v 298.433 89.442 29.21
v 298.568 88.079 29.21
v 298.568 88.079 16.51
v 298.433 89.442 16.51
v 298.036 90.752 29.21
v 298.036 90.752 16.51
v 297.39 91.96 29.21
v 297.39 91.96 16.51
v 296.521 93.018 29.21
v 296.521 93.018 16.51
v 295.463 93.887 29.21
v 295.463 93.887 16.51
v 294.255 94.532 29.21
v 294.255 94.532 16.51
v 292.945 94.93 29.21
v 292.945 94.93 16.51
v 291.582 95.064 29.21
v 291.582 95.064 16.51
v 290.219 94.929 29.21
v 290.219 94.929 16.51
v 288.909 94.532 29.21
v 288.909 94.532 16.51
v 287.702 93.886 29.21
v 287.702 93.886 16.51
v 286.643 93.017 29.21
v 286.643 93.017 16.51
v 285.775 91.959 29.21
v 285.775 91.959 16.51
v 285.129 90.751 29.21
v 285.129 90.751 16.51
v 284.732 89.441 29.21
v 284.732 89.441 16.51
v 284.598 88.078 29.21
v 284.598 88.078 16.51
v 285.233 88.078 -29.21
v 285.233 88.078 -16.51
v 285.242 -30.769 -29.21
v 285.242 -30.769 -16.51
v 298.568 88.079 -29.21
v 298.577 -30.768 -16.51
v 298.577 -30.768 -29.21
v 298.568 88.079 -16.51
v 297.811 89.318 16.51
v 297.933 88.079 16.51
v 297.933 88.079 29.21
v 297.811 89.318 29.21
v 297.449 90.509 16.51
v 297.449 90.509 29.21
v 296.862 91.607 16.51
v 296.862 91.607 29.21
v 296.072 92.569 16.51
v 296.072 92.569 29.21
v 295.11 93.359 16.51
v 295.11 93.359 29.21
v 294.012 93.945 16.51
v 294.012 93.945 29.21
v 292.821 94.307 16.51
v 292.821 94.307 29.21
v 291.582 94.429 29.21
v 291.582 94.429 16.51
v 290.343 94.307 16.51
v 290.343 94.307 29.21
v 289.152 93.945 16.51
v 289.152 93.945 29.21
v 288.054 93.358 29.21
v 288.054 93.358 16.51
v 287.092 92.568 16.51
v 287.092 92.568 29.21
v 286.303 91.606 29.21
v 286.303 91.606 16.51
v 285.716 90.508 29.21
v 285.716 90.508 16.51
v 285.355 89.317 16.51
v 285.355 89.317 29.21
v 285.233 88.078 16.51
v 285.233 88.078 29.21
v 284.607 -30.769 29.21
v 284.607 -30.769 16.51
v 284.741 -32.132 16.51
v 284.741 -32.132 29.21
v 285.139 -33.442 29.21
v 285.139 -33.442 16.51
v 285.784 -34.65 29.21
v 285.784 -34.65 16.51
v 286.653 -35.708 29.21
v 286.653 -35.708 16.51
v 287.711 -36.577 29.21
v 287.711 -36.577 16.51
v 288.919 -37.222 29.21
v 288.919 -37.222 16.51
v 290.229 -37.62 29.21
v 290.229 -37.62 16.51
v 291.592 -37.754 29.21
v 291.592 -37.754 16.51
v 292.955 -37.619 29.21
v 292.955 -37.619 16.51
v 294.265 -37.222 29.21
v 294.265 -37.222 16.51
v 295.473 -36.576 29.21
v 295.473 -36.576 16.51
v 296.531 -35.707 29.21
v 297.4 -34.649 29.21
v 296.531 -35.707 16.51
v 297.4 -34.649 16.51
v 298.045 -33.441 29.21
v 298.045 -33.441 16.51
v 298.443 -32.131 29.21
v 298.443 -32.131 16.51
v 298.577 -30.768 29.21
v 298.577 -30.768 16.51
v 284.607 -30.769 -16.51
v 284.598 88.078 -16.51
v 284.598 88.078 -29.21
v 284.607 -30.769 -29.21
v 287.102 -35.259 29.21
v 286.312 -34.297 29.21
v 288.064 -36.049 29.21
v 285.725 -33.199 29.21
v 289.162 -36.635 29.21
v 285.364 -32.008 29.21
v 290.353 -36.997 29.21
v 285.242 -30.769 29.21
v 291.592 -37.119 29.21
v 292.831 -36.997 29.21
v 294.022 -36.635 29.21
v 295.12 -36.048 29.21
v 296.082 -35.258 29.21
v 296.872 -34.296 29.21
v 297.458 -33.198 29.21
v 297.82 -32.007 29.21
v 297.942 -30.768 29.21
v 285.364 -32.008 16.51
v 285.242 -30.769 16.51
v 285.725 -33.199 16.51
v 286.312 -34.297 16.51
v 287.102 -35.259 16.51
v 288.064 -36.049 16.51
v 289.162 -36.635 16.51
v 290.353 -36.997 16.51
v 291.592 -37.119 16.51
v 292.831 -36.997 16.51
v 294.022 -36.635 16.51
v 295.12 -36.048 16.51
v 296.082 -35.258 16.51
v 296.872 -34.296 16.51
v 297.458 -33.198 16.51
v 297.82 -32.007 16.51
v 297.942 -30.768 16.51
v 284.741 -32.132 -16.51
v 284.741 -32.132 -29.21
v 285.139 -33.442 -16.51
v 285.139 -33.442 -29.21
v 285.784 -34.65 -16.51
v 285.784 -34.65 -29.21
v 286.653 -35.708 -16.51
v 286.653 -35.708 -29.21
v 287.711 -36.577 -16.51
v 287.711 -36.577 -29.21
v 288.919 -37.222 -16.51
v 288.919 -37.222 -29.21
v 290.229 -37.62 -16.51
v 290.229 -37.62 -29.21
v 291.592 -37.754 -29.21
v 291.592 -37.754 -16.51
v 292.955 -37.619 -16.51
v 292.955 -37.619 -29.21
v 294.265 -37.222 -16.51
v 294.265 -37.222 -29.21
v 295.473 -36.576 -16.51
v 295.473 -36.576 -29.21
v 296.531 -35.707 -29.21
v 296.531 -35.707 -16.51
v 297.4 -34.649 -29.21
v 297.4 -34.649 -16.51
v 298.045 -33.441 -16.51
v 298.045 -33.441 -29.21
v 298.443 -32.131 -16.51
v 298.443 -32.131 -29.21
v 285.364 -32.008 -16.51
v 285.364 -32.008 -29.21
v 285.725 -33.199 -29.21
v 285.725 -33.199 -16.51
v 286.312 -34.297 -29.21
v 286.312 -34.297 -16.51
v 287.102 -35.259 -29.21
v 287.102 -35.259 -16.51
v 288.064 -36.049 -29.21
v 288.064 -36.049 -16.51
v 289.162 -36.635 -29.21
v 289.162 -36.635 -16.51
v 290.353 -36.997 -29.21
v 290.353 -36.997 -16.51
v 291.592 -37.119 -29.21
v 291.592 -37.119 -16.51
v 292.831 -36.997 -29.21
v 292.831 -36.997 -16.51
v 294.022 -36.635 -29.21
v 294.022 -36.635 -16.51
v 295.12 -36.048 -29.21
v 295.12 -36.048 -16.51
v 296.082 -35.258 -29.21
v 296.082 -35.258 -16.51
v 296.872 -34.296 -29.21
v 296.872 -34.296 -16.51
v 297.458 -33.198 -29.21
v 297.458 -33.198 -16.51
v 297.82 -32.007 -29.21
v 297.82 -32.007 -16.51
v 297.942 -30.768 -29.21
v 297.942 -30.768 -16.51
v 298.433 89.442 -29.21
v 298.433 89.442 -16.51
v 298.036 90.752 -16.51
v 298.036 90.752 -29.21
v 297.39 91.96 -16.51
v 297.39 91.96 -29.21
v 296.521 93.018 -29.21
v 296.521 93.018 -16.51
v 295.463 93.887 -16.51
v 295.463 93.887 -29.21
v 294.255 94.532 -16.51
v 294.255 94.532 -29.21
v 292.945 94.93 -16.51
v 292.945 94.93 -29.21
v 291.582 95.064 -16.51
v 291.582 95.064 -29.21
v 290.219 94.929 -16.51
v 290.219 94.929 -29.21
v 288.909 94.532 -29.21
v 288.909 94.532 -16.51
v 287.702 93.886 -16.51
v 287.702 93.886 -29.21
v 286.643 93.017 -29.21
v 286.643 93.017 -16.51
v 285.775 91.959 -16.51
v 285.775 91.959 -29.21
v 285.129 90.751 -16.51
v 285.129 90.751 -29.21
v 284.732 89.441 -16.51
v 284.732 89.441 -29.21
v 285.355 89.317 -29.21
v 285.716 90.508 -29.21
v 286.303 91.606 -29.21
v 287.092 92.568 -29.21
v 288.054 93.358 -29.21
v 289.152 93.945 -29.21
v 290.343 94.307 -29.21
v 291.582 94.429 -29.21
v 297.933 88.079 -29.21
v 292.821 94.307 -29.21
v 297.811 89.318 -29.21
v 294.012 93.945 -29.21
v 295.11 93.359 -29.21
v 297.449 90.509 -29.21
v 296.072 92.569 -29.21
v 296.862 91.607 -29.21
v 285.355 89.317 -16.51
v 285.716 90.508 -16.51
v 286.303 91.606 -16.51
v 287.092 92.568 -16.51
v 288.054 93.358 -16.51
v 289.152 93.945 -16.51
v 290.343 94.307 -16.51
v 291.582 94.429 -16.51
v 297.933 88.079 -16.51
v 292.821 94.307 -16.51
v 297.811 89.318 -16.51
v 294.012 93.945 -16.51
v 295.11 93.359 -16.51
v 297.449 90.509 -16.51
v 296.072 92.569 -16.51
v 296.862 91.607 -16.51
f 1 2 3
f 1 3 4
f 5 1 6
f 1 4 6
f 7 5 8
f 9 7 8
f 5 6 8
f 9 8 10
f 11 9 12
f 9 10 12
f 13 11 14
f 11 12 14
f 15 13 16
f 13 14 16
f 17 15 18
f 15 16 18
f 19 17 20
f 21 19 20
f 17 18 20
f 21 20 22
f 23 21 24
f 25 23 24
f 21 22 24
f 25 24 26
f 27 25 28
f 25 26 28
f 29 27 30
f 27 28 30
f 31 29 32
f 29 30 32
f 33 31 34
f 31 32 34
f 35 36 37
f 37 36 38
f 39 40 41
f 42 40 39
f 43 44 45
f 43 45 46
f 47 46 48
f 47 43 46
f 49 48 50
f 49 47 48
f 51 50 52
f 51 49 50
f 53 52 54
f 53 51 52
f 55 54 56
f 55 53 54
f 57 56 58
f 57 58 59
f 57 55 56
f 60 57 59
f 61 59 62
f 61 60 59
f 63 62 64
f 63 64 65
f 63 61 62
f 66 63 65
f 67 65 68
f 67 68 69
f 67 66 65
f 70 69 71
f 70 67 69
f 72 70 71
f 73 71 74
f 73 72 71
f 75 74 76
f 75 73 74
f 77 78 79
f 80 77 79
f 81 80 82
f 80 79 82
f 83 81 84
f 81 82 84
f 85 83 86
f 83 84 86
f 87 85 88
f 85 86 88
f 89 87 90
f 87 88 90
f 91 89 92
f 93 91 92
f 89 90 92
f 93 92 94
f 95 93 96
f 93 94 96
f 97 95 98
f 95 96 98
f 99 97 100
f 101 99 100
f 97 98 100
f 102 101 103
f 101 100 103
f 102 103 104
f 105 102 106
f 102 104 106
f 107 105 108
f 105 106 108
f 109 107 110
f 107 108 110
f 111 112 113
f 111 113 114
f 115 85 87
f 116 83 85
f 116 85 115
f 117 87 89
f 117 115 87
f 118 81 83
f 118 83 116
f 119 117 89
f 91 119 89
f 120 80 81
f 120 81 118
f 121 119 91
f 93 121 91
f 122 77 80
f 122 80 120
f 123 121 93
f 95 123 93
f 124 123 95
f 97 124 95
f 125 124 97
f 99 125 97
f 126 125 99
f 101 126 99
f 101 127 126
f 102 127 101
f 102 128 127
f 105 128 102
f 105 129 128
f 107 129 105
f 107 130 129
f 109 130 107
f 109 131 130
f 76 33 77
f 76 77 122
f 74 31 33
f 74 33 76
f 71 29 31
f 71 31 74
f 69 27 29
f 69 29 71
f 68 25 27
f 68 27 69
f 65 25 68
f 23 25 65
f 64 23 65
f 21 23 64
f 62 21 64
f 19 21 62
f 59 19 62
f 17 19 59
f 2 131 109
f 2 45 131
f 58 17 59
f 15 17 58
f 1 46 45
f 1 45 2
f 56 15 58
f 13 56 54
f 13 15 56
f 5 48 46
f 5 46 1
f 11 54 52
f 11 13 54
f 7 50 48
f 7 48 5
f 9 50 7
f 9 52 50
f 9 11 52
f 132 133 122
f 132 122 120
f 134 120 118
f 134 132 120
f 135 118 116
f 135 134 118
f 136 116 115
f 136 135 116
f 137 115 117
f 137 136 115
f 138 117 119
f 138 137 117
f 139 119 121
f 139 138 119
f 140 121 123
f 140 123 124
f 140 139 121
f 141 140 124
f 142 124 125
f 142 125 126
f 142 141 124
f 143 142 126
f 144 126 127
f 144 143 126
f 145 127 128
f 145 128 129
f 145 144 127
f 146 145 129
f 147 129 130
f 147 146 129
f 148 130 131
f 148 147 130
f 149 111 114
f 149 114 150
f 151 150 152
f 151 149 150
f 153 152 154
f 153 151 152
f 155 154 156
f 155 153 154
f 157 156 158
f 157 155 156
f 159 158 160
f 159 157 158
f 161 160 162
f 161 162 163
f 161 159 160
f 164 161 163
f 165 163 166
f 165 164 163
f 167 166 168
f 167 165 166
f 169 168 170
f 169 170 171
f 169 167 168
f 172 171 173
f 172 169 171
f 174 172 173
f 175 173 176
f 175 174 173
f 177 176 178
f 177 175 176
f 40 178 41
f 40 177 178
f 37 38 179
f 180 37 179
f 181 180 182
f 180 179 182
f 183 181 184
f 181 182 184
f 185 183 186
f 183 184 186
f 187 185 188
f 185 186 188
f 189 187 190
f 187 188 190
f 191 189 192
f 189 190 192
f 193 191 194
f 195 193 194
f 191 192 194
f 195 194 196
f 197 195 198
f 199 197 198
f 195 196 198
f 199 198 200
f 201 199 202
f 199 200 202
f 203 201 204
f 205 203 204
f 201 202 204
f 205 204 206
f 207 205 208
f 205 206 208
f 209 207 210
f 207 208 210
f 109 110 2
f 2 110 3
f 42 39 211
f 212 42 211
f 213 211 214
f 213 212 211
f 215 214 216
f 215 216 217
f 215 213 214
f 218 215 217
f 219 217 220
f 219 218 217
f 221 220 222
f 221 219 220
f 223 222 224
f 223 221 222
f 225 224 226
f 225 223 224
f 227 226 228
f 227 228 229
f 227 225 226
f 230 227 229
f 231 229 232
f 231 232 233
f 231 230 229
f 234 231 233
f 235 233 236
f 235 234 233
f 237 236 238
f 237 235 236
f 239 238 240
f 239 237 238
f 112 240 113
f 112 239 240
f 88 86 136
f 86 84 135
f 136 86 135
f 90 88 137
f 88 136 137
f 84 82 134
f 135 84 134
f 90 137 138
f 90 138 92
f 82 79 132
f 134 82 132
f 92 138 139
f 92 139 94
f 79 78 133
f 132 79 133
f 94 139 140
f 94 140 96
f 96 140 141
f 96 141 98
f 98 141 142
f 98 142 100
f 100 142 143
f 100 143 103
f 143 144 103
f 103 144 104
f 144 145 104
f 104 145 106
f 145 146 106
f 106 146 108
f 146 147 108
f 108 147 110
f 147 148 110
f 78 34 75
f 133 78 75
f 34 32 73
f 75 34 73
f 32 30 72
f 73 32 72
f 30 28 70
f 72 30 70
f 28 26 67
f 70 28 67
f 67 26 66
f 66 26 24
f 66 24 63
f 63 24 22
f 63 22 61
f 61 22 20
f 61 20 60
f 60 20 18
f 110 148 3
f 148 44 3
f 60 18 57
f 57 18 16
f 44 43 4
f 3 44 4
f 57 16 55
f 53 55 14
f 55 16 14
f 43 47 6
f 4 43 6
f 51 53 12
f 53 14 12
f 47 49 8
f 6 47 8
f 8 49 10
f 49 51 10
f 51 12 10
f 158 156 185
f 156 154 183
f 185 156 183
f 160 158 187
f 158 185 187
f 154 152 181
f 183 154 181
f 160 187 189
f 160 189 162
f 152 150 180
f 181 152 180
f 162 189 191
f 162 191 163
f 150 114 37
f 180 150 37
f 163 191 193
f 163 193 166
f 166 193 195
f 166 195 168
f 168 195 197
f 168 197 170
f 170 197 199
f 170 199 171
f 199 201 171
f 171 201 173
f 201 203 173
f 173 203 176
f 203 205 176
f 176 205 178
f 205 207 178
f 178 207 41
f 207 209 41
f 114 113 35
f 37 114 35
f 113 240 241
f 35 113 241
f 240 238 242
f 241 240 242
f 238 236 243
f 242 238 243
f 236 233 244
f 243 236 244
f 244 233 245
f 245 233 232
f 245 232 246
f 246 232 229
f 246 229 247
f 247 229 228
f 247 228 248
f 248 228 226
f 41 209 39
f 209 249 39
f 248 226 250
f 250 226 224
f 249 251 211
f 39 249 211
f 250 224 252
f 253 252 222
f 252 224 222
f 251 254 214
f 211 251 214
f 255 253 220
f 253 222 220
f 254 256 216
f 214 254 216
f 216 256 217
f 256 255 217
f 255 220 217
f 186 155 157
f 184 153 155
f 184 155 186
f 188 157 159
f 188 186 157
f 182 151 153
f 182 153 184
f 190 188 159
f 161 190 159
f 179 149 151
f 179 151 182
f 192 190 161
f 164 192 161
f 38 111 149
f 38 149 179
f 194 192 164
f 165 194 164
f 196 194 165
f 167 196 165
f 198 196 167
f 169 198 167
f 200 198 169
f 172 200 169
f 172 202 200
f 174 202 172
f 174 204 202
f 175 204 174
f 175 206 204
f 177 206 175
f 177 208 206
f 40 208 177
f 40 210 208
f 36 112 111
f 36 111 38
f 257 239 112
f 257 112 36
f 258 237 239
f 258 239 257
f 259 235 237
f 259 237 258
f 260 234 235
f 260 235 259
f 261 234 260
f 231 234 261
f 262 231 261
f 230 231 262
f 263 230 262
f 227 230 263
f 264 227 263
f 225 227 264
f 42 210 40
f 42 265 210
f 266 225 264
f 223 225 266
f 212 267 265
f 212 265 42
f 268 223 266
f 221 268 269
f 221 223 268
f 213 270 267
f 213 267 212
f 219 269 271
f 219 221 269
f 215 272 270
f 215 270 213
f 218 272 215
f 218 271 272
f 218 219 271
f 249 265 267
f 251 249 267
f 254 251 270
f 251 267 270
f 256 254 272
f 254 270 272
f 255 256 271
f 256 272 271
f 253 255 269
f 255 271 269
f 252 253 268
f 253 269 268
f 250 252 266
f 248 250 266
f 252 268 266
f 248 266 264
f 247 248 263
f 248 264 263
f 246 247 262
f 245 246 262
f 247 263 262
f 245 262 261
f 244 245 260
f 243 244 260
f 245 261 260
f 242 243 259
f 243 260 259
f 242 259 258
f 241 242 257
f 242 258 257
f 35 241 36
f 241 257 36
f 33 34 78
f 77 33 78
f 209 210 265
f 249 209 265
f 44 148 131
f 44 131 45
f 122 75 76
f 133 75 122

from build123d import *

# Parameters (mm, degrees)
BOSS_EXTRUDE1_START = 16.51
BOSS_EXTRUDE1_DEPTH = 12.7


with BuildPart() as part:
    # Sketch1 → Boss-Extrude1 (new body)
    with BuildSketch(Plane.XY.offset(BOSS_EXTRUDE1_START)):
        with BuildLine():
            Line((284.597674513, 88.078143699), (284.606648072, -30.769188909))
            ThreePointArc((284.606648072, -30.769188909), (291.592175454, -37.753661487), (298.576648032, -30.768134106))
            Line((298.576648032, -30.768134106), (298.567674474, 88.079198502))
            ThreePointArc((298.567674474, 88.079198502), (291.582147092, 95.06367108), (284.597674513, 88.078143699))
        make_face()
        with BuildLine():
            Line((285.232674512, 88.078191644), (285.24164807, -30.769140964))
            ThreePointArc((285.24164807, -30.769140964), (291.592127508, -37.118661489), (297.941648034, -30.768182051))
            Line((297.941648034, -30.768182051), (297.932674475, 88.079150557))
            ThreePointArc((297.932674475, 88.079150557), (291.582195037, 94.428671082), (285.232674512, 88.078191644))
        make_face(mode=Mode.SUBTRACT)
    extrude(amount=BOSS_EXTRUDE1_DEPTH)


with BuildPart() as body_2:
    # Mirror2: mirrored copy
    add(part.part.mirror(Plane.XY))


solid = Compound([part.part, body_2.part])
